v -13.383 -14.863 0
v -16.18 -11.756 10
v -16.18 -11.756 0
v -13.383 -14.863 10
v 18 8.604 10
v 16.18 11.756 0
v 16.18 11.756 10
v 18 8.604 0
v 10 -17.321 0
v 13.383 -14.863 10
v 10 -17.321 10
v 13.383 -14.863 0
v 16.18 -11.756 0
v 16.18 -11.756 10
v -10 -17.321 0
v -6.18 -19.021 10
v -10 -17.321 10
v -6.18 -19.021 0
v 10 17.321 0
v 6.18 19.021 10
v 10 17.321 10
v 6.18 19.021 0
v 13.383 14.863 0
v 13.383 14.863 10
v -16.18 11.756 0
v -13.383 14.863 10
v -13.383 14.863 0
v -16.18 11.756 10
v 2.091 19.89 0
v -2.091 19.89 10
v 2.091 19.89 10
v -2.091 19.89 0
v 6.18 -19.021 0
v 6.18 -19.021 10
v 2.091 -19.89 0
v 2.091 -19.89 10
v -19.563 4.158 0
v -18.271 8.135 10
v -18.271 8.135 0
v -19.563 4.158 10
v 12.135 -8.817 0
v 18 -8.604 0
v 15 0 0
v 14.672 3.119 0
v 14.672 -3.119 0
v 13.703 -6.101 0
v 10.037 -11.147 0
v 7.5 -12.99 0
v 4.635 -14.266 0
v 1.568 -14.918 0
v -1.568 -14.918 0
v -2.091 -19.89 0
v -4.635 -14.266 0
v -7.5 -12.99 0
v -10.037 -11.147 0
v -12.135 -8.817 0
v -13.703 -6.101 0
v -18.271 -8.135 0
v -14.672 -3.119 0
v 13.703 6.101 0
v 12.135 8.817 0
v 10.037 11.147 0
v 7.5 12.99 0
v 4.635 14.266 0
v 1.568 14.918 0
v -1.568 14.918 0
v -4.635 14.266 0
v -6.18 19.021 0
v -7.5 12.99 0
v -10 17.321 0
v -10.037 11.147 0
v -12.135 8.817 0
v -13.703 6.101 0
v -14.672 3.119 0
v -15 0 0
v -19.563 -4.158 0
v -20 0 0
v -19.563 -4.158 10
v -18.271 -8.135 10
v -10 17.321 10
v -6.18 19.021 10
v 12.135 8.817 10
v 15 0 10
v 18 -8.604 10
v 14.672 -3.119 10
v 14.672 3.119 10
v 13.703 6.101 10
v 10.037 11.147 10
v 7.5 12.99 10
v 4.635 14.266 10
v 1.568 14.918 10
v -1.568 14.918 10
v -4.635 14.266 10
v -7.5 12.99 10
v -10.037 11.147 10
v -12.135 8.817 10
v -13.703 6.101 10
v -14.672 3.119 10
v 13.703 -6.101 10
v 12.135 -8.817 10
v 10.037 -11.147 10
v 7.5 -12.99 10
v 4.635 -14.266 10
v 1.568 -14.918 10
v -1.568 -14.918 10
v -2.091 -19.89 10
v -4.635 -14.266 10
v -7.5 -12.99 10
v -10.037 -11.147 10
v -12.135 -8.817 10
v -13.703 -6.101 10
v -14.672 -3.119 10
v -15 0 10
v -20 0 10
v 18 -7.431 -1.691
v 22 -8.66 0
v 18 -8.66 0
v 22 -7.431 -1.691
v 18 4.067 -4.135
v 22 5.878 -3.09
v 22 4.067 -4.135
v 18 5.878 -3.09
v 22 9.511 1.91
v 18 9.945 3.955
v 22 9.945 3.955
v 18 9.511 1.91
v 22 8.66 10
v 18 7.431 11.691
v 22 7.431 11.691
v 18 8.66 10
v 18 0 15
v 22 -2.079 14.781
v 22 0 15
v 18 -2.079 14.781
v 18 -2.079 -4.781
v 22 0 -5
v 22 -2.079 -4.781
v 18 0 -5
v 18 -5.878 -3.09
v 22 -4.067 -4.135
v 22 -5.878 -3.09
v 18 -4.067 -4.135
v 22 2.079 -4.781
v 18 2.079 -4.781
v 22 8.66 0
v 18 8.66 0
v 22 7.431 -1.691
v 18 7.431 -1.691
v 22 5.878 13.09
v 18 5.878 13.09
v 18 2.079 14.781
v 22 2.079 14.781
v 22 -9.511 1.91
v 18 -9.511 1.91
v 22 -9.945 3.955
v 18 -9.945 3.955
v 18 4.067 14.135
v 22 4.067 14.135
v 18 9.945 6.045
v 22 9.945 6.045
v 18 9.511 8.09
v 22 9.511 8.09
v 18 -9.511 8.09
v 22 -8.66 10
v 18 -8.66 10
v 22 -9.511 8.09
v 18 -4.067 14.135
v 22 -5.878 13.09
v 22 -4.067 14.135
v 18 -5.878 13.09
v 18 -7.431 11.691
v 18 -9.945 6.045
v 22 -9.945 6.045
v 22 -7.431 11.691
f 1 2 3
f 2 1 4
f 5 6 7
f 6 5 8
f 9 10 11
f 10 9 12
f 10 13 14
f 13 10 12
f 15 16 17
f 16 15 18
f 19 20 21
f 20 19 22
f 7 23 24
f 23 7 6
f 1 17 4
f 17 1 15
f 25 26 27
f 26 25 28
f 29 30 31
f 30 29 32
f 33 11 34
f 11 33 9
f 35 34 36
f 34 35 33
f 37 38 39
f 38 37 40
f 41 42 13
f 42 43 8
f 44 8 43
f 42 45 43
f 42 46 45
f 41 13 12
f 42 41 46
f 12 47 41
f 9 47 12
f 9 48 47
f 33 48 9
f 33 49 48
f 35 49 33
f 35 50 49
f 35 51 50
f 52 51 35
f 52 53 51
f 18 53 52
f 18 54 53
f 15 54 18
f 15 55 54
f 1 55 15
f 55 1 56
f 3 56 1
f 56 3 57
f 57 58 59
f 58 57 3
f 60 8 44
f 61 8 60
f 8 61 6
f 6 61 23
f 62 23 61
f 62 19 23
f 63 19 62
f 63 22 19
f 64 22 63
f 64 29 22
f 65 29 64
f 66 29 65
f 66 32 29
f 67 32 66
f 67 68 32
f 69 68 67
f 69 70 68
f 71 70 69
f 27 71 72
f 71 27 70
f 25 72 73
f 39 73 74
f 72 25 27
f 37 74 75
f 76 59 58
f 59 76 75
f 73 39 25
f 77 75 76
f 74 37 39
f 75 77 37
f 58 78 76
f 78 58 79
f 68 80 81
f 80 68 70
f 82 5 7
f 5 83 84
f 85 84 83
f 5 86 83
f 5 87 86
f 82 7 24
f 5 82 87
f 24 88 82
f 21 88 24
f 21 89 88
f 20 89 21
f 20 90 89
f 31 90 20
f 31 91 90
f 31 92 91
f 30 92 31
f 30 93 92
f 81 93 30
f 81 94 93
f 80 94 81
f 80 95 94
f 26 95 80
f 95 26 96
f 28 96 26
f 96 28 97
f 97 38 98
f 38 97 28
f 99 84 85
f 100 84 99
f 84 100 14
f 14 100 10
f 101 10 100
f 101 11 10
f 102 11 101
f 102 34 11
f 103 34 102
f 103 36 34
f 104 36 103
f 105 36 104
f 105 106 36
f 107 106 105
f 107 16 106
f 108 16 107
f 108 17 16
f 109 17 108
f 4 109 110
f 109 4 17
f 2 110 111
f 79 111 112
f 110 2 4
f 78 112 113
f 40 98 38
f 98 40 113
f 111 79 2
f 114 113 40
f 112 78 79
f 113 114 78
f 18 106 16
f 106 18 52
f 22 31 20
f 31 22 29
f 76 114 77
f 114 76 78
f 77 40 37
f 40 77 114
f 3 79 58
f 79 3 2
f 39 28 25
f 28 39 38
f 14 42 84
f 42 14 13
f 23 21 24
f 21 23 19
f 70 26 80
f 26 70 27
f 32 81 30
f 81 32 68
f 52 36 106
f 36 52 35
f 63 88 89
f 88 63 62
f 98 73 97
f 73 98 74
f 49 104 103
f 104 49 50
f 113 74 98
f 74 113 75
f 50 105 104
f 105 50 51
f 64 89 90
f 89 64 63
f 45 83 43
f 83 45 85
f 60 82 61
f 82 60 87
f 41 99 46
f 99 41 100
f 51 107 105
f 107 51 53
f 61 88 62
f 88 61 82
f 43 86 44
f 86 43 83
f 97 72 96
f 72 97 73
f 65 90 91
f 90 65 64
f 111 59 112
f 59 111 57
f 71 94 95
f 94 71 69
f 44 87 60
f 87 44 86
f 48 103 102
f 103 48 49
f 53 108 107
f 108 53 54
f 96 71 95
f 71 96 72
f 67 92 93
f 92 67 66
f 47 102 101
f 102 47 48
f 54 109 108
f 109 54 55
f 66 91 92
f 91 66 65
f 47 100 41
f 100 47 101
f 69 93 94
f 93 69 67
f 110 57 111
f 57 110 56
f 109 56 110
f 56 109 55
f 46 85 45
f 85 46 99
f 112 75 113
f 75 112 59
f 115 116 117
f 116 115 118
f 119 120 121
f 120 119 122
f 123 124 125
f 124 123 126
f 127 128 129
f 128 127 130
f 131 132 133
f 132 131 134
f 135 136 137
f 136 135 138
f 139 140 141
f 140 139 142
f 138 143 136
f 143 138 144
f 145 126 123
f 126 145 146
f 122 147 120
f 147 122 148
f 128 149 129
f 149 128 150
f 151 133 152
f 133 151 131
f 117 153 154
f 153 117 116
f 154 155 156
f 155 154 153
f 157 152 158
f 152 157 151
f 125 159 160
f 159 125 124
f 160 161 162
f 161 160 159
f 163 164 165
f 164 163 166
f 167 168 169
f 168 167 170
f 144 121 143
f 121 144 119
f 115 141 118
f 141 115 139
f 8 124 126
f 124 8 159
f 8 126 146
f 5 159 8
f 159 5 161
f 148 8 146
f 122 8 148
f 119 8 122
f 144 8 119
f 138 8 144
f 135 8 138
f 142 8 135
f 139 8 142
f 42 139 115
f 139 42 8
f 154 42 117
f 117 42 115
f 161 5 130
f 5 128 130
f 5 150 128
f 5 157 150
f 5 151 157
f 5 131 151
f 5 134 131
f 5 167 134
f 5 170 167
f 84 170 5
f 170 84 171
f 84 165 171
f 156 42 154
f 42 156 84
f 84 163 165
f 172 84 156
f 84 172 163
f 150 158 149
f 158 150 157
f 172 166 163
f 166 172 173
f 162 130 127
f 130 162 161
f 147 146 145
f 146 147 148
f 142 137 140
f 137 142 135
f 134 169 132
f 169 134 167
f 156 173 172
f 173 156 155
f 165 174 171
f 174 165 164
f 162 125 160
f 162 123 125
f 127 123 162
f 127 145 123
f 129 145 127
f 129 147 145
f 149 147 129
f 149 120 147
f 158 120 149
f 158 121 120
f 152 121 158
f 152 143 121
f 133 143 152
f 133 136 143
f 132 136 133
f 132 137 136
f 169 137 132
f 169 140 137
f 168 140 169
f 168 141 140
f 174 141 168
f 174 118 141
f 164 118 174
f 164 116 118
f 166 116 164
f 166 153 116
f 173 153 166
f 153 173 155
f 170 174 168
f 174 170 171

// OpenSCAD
union() {
    translate([18,0,5])
    rotate([0,90,0])  cylinder(h=4, r=10);
    difference() {
        cylinder(h=10, r=20);
        cylinder(h=10, r=15);
    }
}
